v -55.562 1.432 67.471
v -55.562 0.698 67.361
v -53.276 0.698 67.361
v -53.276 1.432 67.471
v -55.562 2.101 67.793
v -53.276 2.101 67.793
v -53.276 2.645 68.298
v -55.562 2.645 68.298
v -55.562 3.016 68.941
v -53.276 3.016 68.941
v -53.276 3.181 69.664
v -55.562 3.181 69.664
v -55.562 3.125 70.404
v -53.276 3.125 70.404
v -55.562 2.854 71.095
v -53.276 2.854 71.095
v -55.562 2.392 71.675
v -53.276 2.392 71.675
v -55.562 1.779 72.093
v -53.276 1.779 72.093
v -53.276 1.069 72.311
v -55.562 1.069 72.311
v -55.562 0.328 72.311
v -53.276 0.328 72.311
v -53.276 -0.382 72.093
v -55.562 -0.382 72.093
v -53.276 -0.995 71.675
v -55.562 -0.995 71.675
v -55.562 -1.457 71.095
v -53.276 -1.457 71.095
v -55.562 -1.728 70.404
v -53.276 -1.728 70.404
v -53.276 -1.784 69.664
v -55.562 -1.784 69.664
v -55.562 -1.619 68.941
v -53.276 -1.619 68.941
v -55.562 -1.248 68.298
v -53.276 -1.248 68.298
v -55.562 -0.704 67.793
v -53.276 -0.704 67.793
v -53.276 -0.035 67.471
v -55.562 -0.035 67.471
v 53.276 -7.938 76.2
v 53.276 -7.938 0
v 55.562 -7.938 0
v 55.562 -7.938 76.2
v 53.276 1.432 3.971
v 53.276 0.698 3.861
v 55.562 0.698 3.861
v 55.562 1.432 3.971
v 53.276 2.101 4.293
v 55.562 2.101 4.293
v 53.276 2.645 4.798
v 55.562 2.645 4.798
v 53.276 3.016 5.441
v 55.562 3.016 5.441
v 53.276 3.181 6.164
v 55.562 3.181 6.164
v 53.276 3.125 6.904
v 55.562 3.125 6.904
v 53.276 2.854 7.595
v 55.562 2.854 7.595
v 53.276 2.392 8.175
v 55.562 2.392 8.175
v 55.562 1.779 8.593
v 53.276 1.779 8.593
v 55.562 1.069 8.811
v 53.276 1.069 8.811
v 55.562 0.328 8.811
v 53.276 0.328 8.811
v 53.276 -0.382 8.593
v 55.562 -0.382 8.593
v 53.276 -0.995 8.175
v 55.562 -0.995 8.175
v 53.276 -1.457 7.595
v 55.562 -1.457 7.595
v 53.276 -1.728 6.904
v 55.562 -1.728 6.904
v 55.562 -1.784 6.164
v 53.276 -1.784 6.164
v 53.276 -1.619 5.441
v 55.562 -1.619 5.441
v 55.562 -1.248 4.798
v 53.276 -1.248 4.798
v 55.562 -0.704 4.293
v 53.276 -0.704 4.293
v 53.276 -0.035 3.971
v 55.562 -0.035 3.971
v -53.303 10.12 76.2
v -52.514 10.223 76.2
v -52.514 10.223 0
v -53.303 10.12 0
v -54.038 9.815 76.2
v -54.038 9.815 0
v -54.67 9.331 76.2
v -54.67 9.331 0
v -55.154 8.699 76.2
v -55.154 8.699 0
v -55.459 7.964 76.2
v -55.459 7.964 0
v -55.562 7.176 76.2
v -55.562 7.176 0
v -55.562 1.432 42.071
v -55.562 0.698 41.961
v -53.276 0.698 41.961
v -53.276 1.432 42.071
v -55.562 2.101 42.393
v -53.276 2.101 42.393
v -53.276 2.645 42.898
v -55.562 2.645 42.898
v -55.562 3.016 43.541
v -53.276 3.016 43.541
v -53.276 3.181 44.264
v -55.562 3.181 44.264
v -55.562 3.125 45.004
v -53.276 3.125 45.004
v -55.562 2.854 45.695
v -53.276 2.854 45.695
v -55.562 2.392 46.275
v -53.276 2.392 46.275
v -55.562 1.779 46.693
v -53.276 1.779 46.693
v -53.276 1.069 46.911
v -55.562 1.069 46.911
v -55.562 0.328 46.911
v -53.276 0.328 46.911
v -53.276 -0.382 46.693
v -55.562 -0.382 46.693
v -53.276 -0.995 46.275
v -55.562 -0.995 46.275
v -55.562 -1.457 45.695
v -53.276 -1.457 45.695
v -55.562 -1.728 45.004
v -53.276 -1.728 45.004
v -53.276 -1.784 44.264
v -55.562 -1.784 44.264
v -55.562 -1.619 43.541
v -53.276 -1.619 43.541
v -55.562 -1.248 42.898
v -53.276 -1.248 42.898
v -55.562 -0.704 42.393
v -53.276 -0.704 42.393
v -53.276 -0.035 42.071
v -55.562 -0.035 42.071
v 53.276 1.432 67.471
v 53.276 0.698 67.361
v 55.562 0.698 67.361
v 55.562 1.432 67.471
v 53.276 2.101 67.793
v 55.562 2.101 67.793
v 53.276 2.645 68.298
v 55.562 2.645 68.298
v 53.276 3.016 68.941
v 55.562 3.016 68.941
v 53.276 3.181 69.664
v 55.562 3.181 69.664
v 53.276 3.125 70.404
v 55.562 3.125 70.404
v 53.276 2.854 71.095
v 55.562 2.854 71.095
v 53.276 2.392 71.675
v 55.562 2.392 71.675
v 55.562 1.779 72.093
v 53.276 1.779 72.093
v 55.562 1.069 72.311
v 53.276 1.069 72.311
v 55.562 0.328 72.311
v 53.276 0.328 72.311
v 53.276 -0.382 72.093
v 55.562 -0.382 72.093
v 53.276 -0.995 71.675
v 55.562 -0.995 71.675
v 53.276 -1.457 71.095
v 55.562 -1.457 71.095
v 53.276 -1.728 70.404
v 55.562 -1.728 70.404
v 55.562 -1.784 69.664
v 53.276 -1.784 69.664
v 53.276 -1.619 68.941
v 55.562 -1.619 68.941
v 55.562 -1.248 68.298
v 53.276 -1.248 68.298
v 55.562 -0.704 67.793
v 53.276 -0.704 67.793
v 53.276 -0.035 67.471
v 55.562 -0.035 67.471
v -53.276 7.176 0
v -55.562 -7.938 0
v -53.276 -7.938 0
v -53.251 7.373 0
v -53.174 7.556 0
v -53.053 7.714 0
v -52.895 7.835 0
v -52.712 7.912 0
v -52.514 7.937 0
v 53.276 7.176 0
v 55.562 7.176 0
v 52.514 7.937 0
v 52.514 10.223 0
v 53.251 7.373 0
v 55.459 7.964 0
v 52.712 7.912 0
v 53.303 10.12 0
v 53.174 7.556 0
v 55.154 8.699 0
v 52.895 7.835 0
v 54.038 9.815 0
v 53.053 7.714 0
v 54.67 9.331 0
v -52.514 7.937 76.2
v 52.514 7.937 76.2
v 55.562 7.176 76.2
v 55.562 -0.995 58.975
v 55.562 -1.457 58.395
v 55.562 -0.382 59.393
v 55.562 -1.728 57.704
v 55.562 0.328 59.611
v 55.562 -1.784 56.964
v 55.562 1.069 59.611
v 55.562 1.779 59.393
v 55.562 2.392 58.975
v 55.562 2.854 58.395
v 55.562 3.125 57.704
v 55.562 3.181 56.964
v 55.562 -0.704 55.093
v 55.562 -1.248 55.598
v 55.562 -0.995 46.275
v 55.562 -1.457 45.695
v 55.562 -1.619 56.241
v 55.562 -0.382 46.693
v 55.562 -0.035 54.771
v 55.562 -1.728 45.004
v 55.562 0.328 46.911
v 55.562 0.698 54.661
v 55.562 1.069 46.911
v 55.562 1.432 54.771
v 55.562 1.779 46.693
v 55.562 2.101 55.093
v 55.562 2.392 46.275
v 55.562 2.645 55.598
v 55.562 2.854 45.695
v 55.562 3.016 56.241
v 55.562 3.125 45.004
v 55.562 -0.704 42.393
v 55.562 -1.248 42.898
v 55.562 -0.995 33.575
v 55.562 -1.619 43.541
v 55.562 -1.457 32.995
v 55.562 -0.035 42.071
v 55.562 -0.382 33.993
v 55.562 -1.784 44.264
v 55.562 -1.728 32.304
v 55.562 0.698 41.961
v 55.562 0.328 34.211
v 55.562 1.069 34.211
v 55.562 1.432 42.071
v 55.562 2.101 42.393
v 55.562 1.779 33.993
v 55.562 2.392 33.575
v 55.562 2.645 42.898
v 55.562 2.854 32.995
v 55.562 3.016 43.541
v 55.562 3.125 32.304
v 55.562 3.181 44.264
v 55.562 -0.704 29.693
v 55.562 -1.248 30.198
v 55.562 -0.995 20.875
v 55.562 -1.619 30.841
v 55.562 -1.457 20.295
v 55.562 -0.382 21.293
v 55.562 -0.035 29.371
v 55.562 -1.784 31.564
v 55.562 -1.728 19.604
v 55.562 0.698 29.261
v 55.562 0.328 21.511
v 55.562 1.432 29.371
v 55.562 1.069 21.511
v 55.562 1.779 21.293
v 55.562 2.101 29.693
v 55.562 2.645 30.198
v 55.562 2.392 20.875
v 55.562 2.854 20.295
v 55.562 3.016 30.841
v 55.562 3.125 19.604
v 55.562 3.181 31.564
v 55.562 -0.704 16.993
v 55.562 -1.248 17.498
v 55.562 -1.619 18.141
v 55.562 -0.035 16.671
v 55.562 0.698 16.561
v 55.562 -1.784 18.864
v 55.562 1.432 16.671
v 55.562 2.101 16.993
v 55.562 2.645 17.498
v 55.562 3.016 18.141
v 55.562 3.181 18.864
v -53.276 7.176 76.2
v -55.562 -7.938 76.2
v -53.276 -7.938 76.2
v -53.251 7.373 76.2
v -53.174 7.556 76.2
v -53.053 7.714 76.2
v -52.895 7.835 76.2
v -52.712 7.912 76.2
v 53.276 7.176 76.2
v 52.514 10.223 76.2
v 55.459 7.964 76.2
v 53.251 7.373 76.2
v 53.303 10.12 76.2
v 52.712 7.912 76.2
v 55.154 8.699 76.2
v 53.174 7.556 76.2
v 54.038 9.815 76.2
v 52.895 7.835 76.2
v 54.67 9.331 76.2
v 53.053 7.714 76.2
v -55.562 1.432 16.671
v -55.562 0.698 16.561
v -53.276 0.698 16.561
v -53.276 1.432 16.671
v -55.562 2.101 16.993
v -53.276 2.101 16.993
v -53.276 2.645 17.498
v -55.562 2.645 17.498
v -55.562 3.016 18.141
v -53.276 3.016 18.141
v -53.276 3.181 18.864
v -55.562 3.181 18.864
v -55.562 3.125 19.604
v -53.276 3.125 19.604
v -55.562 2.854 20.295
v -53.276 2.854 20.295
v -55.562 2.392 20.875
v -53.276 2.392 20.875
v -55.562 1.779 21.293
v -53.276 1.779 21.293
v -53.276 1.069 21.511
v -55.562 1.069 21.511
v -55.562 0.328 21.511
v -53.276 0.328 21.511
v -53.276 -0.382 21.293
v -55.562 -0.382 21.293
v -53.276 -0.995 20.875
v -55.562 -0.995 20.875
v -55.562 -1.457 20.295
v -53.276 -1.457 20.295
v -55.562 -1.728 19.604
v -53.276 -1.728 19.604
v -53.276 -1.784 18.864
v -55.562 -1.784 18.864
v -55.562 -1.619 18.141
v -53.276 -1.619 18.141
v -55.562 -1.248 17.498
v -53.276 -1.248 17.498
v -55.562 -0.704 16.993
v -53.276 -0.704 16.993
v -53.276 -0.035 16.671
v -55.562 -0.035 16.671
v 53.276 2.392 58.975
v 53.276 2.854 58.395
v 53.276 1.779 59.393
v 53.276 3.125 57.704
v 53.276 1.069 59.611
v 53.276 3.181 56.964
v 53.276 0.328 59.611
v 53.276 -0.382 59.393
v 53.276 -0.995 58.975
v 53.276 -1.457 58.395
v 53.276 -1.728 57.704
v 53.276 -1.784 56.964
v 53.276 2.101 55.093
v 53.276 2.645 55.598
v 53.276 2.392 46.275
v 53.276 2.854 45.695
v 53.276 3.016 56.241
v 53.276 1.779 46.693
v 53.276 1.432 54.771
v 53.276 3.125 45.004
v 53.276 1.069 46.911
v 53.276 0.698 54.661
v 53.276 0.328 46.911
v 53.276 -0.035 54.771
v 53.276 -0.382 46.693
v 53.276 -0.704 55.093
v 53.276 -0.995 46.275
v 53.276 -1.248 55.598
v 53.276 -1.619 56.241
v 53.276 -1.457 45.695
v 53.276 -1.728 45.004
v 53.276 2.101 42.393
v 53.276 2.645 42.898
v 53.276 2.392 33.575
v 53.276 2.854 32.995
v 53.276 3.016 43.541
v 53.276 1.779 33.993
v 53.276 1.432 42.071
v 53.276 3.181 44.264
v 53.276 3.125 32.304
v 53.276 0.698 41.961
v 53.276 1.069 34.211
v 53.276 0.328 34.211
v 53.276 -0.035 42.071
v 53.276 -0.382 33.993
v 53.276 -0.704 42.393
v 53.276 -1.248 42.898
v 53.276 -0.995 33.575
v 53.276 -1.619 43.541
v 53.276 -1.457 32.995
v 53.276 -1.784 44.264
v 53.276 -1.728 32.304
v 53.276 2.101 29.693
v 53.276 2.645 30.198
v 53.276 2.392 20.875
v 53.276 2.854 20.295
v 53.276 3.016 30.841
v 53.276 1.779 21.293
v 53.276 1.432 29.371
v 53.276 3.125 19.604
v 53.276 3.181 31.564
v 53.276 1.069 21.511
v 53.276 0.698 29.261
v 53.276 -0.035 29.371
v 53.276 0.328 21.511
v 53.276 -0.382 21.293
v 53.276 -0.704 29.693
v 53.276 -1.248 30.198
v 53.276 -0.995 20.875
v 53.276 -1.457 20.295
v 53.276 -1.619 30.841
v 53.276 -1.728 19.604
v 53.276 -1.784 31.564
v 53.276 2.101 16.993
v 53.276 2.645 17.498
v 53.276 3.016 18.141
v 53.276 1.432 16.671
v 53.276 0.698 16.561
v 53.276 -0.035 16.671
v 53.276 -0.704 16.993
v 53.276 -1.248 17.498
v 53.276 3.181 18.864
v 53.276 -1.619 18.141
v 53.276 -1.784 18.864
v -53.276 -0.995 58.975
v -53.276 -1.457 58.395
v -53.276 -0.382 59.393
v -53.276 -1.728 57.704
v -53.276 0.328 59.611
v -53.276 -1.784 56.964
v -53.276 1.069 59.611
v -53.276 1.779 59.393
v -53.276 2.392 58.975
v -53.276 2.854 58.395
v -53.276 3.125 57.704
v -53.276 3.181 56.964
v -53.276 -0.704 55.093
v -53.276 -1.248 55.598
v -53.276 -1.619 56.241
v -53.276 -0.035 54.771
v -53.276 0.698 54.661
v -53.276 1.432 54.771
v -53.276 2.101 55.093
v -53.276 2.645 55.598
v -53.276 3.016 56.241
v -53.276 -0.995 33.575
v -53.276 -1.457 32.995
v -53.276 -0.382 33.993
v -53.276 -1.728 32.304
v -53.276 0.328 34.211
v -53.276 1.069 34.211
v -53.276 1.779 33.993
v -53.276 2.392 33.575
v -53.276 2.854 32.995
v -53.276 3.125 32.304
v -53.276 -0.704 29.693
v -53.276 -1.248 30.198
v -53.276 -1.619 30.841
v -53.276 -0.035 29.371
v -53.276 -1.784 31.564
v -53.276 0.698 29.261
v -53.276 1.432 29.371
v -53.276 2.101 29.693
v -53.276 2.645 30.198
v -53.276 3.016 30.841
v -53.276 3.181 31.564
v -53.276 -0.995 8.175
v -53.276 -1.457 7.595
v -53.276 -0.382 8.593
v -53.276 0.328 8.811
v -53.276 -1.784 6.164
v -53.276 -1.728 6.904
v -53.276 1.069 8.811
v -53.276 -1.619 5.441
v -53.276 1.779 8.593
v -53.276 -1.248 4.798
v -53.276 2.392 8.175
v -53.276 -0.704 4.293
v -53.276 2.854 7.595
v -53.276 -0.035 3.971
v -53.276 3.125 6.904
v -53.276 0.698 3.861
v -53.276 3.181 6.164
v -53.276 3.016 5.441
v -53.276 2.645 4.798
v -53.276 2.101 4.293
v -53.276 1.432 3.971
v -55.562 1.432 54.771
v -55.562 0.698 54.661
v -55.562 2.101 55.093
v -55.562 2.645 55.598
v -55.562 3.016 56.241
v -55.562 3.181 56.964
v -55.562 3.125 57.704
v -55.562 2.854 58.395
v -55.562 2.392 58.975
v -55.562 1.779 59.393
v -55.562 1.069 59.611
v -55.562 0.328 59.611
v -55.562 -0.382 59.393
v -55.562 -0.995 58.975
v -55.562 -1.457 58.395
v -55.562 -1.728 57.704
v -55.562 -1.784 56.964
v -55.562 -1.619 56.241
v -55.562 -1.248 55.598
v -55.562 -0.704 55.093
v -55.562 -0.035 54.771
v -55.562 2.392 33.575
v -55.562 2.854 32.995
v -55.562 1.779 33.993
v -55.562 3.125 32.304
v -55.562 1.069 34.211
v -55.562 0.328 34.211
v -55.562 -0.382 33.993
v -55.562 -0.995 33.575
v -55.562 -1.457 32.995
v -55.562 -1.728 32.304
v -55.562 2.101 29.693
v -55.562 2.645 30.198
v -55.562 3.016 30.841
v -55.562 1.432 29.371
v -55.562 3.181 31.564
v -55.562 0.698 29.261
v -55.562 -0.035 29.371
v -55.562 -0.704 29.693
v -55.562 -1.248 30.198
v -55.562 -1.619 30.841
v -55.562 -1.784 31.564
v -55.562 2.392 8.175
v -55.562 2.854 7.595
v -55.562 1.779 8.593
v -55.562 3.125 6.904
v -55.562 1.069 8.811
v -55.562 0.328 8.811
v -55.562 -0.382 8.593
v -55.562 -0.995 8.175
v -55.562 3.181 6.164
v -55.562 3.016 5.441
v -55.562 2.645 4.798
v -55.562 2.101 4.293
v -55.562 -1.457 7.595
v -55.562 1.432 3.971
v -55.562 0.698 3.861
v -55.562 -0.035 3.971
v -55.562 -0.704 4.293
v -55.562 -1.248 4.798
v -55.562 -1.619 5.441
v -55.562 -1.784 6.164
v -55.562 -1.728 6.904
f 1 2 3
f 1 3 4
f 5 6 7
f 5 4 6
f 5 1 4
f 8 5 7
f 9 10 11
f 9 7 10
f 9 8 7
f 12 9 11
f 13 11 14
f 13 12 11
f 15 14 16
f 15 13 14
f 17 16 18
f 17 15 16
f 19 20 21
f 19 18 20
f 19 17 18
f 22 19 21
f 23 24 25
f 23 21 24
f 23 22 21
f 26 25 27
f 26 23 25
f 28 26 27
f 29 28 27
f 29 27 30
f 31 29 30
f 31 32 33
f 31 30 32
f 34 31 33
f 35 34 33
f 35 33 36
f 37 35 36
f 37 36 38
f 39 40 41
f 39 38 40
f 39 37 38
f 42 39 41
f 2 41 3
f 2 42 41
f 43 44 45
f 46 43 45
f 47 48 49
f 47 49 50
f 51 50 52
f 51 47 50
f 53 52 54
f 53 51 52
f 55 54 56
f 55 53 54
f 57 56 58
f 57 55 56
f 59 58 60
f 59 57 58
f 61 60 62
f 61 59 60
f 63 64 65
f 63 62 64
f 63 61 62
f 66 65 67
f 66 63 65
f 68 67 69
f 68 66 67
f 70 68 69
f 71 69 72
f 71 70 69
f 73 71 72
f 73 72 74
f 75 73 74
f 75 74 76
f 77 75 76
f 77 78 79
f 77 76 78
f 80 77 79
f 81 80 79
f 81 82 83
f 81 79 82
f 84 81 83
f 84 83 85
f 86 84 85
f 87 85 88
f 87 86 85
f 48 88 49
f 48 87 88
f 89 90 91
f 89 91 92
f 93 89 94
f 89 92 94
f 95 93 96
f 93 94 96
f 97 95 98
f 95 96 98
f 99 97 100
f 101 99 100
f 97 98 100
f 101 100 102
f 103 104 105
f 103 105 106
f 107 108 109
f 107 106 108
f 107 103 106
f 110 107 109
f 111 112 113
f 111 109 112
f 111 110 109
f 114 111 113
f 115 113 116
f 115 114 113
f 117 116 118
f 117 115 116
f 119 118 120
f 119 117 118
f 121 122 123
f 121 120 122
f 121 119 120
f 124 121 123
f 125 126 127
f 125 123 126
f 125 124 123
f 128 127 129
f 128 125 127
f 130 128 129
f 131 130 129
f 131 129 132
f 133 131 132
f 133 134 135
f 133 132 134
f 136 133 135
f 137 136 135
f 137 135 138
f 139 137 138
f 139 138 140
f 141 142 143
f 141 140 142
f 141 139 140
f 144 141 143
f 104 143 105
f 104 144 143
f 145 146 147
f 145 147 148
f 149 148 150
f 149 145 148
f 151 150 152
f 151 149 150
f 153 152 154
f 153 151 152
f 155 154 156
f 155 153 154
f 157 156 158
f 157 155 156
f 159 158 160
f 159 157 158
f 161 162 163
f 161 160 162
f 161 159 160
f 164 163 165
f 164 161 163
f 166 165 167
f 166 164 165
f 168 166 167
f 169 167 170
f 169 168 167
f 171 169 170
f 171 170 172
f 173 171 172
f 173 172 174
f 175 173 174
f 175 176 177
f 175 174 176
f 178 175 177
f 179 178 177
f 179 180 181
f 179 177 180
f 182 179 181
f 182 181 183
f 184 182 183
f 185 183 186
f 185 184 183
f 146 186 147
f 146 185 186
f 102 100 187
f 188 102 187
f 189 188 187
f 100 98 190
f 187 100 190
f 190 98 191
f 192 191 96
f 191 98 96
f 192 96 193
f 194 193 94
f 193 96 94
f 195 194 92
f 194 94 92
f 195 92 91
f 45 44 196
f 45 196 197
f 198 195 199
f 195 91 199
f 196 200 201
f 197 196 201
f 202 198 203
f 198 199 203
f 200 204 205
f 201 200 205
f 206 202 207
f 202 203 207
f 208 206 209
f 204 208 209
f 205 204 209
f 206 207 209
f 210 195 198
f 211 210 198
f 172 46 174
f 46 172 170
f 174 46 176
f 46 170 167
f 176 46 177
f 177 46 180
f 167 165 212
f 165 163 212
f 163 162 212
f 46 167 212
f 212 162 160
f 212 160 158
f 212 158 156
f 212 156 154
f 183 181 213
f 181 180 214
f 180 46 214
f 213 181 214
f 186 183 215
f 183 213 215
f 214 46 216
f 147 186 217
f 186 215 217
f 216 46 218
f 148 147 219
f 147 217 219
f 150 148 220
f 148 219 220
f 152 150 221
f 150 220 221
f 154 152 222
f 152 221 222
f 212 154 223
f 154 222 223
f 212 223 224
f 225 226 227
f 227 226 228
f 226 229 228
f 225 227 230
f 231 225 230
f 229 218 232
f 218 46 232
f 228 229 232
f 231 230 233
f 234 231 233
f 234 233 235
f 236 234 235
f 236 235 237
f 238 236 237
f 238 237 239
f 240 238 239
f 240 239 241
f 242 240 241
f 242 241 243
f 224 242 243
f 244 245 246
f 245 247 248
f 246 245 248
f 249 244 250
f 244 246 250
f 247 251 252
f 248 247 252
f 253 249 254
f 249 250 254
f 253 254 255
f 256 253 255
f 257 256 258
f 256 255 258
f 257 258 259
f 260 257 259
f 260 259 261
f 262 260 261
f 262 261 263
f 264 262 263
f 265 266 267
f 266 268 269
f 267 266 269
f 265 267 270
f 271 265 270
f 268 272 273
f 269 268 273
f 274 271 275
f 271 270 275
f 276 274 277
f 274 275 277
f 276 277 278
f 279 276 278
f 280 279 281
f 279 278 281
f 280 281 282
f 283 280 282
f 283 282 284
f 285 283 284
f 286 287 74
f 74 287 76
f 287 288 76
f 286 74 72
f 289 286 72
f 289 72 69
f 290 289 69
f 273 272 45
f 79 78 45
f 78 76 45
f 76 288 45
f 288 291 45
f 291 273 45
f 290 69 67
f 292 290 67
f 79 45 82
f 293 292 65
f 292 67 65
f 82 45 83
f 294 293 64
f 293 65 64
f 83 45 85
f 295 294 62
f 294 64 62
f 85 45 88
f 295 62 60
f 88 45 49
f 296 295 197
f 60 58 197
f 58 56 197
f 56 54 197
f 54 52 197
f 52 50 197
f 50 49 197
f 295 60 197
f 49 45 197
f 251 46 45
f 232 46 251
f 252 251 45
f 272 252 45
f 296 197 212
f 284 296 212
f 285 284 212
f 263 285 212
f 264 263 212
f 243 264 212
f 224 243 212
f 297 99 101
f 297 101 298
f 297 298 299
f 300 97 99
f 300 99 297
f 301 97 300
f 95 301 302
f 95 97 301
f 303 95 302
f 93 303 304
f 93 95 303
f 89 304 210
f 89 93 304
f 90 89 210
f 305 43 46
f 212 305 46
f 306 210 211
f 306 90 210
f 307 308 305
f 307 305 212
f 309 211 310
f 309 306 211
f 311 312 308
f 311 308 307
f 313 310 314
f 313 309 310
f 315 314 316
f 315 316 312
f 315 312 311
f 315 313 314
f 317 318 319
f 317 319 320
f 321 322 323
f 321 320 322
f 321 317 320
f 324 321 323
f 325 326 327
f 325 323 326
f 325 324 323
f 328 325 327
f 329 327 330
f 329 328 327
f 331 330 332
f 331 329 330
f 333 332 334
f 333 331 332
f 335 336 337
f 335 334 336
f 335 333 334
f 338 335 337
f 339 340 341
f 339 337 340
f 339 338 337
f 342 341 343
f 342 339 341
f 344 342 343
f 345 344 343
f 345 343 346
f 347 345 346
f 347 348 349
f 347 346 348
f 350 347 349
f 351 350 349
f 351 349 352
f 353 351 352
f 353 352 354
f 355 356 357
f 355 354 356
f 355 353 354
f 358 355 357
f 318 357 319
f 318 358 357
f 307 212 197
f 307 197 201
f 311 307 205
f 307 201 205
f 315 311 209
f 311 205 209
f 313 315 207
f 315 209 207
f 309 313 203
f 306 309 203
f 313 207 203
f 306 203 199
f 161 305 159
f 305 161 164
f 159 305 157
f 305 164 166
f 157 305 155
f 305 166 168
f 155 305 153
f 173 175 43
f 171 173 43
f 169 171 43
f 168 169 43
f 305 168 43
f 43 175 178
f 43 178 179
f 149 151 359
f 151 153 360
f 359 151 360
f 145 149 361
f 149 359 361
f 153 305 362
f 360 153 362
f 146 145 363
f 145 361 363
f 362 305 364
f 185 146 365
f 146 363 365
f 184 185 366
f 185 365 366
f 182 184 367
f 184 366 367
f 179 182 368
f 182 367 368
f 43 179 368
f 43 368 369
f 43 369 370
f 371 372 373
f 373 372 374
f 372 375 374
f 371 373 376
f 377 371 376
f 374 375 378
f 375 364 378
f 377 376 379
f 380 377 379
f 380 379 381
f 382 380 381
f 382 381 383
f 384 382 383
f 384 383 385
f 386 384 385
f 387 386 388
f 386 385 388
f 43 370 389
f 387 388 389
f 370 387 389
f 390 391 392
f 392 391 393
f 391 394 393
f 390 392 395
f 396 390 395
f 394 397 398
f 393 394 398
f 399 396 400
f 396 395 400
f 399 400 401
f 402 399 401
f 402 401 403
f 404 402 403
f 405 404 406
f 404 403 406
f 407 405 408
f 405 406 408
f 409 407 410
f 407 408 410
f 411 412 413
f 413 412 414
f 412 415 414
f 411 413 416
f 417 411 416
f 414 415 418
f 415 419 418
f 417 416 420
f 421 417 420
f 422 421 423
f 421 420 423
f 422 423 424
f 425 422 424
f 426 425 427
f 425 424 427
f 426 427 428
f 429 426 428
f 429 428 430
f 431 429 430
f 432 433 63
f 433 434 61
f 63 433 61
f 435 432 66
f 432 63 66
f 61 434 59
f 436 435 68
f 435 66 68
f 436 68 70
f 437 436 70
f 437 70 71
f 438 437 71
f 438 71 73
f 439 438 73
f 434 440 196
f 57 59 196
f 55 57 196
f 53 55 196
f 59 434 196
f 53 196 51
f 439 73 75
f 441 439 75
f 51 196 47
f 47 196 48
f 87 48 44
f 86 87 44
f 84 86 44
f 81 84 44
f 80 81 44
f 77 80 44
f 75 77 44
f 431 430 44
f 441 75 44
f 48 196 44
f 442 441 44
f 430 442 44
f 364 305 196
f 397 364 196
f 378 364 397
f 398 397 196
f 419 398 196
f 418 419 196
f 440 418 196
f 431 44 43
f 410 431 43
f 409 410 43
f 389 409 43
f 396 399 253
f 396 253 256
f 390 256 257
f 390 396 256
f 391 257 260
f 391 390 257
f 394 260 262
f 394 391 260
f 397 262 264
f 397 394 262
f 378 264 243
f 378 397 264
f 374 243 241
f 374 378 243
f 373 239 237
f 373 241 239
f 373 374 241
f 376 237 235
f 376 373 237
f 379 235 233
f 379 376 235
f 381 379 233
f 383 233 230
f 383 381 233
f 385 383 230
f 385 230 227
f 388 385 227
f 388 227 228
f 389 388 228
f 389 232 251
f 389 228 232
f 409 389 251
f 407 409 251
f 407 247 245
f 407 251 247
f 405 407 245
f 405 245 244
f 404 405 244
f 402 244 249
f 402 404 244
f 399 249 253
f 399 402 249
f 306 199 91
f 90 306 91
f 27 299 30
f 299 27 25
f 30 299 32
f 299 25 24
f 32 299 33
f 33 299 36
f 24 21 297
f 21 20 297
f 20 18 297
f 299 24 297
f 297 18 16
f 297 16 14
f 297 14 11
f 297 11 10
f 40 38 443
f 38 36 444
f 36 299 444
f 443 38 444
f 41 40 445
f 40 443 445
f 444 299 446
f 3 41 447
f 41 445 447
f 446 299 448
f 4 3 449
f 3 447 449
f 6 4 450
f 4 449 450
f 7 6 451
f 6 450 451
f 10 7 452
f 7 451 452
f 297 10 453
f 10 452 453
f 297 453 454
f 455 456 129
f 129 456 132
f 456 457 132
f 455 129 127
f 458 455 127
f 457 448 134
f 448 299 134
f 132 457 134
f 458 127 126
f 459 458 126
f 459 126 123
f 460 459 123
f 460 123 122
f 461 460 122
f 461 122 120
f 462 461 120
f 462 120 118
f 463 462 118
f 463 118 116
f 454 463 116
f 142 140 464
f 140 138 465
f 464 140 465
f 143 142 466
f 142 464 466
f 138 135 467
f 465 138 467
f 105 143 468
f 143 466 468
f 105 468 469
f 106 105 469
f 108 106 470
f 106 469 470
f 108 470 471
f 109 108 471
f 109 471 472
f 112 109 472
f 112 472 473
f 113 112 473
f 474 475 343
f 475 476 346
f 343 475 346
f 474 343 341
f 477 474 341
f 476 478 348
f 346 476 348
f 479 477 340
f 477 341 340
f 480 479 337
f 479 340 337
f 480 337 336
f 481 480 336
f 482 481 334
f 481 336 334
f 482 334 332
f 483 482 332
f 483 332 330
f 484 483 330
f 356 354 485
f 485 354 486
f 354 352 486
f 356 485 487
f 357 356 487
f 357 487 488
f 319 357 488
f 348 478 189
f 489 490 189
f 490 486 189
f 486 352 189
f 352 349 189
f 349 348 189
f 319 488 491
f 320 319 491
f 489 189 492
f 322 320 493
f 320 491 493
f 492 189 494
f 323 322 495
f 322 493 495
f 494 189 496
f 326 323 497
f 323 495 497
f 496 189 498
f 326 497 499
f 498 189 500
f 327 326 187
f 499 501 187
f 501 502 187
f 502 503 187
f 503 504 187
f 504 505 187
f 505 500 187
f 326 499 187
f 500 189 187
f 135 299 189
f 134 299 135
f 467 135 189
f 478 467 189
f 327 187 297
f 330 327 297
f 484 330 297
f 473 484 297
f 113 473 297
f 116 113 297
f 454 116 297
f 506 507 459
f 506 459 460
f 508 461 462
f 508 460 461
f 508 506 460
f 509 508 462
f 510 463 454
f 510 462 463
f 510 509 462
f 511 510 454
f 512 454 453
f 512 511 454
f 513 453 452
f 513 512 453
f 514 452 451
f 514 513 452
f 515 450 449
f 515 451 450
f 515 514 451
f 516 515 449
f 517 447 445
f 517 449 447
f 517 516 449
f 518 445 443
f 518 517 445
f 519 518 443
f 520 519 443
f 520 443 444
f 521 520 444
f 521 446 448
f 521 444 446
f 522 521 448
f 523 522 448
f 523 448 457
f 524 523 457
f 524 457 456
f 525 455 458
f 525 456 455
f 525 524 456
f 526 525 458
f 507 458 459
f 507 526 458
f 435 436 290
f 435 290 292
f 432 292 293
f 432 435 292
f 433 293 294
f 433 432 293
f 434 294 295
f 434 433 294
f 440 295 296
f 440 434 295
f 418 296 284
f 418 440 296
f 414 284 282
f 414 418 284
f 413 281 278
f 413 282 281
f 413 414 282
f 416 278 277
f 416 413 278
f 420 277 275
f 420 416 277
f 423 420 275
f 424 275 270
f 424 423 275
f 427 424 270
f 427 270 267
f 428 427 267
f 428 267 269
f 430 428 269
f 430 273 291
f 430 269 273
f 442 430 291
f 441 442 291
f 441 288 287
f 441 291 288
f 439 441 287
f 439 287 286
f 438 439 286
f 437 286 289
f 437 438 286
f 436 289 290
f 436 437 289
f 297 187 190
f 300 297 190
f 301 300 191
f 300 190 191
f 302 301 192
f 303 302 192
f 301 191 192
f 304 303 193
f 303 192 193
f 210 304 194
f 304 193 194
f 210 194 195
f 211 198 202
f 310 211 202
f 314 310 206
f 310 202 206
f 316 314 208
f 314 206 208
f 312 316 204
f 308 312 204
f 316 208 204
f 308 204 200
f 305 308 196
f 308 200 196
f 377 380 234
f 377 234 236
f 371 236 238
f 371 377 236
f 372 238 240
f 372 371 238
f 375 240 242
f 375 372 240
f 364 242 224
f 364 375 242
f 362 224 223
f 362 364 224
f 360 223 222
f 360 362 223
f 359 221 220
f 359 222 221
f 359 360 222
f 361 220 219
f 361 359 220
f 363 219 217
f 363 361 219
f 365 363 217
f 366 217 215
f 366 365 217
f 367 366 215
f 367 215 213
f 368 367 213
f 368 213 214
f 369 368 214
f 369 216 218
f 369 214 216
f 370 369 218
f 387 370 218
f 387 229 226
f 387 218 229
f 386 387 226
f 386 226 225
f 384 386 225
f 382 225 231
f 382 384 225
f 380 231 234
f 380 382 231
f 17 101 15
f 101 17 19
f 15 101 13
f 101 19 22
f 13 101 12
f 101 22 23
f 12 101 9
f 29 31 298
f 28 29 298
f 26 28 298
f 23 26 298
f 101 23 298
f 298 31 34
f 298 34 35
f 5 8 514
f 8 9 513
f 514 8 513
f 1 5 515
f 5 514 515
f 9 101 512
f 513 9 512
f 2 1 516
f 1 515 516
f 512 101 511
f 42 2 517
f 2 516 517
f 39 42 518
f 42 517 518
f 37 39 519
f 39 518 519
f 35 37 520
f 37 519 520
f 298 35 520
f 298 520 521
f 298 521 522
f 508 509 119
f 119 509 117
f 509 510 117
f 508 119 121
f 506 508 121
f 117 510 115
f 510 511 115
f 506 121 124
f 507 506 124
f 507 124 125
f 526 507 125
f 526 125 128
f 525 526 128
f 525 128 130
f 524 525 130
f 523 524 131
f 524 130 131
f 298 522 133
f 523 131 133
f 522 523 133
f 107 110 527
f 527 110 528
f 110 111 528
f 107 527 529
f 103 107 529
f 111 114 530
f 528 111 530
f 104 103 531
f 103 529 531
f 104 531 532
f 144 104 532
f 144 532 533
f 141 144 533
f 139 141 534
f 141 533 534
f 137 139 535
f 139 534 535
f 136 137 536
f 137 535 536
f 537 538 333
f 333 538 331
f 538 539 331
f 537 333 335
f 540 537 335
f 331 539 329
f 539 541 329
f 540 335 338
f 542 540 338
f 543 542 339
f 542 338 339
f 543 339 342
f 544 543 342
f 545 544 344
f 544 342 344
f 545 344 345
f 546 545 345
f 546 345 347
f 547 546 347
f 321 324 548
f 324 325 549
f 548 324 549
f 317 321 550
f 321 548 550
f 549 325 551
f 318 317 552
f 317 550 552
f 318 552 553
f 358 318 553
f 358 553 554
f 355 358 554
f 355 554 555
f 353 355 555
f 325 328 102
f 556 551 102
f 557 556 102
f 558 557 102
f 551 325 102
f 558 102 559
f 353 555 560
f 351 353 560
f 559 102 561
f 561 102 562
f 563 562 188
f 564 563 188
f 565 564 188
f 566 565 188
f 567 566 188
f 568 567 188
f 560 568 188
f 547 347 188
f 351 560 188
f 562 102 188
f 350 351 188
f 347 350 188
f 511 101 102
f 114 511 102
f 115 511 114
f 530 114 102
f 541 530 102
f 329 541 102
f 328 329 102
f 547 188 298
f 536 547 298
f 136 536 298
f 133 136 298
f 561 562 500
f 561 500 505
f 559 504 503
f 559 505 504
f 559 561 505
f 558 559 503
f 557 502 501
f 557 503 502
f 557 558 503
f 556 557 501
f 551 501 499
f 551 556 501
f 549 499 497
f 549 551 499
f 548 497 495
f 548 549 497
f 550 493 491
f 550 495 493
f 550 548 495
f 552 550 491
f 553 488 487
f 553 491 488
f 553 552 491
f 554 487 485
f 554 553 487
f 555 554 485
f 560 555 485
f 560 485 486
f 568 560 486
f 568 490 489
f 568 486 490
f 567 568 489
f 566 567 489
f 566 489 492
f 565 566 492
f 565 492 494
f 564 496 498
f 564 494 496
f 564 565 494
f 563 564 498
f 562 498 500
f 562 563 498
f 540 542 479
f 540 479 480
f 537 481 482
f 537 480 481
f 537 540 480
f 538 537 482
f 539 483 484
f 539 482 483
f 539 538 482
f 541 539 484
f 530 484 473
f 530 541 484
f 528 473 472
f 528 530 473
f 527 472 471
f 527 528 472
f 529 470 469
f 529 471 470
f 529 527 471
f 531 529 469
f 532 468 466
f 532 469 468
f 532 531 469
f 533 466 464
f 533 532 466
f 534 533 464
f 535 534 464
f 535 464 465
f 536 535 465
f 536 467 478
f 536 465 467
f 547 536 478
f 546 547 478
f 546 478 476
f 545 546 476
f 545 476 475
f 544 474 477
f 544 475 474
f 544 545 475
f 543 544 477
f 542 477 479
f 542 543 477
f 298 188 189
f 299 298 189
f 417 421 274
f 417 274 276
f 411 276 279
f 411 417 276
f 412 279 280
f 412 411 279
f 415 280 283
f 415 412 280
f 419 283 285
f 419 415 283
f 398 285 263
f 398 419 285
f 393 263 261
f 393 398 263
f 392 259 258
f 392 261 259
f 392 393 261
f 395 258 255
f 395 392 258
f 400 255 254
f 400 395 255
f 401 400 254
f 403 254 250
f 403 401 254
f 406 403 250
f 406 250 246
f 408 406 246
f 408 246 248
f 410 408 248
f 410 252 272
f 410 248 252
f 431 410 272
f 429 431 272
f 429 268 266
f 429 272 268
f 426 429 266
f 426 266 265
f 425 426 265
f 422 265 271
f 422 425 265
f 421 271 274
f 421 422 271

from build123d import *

# Parameters (mm, degrees)
BASE_FLANGE1_DEPTH      = 76.2
CUT_EXTRUDE1_DEPTH      = 95.858586108
CUT_EXTRUDE1_DEPTH_BACK = 95.858586108
SKETCH3_R               = 2.4892


# Sheet-metal steps are written as plain solids
with BuildPart() as part:
    # Sketch1 → Base-Flange1 (new body)
    with BuildSketch(Plane.XY):
        with BuildLine():
            Line((-53.2765, -7.9375), (-53.2765, 7.1755))
            ThreePointArc((-53.2765, 7.1755), (-53.053315367, 7.714315367), (-52.5145, 7.9375))
            Line((-52.5145, 7.9375), (52.5145, 7.9375))
            ThreePointArc((52.5145, 7.9375), (53.053315367, 7.714315367), (53.2765, 7.1755))
            Line((53.2765, 7.1755), (53.2765, -7.9375))
            Line((53.2765, -7.9375), (55.5625, -7.9375))
            Line((55.5625, -7.9375), (55.5625, 7.1755))
            ThreePointArc((55.5625, 7.1755), (54.669761469, 9.330761469), (52.5145, 10.2235))
            Line((52.5145, 10.2235), (-52.5145, 10.2235))
            ThreePointArc((-52.5145, 10.2235), (-54.669761469, 9.330761469), (-55.5625, 7.1755))
            Line((-55.5625, 7.1755), (-55.5625, -7.9375))
            Line((-55.5625, -7.9375), (-53.2765, -7.9375))
        make_face()
    extrude(amount=BASE_FLANGE1_DEPTH)

    # Sketch3 → Cut-Extrude1 (cut, two sides: drawn at the far end of the back side and taken through both)
    with BuildSketch(Plane(origin=(0, 0, 0), x_dir=(0, 0, -1), z_dir=(1, 0, 0)).offset(-CUT_EXTRUDE1_DEPTH_BACK)):
        with Locations((-6.35, 0.6985)):
            Circle(SKETCH3_R)
        with Locations((-19.05, 0.6985)):
            Circle(SKETCH3_R)
        with Locations((-31.75, 0.6985)):
            Circle(SKETCH3_R)
        with Locations((-44.45, 0.6985)):
            Circle(SKETCH3_R)
        with Locations((-57.15, 0.6985)):
            Circle(SKETCH3_R)
        with Locations((-69.85, 0.6985)):
            Circle(SKETCH3_R)
    extrude(amount=CUT_EXTRUDE1_DEPTH + CUT_EXTRUDE1_DEPTH_BACK, mode=Mode.SUBTRACT)


solid = part.part
